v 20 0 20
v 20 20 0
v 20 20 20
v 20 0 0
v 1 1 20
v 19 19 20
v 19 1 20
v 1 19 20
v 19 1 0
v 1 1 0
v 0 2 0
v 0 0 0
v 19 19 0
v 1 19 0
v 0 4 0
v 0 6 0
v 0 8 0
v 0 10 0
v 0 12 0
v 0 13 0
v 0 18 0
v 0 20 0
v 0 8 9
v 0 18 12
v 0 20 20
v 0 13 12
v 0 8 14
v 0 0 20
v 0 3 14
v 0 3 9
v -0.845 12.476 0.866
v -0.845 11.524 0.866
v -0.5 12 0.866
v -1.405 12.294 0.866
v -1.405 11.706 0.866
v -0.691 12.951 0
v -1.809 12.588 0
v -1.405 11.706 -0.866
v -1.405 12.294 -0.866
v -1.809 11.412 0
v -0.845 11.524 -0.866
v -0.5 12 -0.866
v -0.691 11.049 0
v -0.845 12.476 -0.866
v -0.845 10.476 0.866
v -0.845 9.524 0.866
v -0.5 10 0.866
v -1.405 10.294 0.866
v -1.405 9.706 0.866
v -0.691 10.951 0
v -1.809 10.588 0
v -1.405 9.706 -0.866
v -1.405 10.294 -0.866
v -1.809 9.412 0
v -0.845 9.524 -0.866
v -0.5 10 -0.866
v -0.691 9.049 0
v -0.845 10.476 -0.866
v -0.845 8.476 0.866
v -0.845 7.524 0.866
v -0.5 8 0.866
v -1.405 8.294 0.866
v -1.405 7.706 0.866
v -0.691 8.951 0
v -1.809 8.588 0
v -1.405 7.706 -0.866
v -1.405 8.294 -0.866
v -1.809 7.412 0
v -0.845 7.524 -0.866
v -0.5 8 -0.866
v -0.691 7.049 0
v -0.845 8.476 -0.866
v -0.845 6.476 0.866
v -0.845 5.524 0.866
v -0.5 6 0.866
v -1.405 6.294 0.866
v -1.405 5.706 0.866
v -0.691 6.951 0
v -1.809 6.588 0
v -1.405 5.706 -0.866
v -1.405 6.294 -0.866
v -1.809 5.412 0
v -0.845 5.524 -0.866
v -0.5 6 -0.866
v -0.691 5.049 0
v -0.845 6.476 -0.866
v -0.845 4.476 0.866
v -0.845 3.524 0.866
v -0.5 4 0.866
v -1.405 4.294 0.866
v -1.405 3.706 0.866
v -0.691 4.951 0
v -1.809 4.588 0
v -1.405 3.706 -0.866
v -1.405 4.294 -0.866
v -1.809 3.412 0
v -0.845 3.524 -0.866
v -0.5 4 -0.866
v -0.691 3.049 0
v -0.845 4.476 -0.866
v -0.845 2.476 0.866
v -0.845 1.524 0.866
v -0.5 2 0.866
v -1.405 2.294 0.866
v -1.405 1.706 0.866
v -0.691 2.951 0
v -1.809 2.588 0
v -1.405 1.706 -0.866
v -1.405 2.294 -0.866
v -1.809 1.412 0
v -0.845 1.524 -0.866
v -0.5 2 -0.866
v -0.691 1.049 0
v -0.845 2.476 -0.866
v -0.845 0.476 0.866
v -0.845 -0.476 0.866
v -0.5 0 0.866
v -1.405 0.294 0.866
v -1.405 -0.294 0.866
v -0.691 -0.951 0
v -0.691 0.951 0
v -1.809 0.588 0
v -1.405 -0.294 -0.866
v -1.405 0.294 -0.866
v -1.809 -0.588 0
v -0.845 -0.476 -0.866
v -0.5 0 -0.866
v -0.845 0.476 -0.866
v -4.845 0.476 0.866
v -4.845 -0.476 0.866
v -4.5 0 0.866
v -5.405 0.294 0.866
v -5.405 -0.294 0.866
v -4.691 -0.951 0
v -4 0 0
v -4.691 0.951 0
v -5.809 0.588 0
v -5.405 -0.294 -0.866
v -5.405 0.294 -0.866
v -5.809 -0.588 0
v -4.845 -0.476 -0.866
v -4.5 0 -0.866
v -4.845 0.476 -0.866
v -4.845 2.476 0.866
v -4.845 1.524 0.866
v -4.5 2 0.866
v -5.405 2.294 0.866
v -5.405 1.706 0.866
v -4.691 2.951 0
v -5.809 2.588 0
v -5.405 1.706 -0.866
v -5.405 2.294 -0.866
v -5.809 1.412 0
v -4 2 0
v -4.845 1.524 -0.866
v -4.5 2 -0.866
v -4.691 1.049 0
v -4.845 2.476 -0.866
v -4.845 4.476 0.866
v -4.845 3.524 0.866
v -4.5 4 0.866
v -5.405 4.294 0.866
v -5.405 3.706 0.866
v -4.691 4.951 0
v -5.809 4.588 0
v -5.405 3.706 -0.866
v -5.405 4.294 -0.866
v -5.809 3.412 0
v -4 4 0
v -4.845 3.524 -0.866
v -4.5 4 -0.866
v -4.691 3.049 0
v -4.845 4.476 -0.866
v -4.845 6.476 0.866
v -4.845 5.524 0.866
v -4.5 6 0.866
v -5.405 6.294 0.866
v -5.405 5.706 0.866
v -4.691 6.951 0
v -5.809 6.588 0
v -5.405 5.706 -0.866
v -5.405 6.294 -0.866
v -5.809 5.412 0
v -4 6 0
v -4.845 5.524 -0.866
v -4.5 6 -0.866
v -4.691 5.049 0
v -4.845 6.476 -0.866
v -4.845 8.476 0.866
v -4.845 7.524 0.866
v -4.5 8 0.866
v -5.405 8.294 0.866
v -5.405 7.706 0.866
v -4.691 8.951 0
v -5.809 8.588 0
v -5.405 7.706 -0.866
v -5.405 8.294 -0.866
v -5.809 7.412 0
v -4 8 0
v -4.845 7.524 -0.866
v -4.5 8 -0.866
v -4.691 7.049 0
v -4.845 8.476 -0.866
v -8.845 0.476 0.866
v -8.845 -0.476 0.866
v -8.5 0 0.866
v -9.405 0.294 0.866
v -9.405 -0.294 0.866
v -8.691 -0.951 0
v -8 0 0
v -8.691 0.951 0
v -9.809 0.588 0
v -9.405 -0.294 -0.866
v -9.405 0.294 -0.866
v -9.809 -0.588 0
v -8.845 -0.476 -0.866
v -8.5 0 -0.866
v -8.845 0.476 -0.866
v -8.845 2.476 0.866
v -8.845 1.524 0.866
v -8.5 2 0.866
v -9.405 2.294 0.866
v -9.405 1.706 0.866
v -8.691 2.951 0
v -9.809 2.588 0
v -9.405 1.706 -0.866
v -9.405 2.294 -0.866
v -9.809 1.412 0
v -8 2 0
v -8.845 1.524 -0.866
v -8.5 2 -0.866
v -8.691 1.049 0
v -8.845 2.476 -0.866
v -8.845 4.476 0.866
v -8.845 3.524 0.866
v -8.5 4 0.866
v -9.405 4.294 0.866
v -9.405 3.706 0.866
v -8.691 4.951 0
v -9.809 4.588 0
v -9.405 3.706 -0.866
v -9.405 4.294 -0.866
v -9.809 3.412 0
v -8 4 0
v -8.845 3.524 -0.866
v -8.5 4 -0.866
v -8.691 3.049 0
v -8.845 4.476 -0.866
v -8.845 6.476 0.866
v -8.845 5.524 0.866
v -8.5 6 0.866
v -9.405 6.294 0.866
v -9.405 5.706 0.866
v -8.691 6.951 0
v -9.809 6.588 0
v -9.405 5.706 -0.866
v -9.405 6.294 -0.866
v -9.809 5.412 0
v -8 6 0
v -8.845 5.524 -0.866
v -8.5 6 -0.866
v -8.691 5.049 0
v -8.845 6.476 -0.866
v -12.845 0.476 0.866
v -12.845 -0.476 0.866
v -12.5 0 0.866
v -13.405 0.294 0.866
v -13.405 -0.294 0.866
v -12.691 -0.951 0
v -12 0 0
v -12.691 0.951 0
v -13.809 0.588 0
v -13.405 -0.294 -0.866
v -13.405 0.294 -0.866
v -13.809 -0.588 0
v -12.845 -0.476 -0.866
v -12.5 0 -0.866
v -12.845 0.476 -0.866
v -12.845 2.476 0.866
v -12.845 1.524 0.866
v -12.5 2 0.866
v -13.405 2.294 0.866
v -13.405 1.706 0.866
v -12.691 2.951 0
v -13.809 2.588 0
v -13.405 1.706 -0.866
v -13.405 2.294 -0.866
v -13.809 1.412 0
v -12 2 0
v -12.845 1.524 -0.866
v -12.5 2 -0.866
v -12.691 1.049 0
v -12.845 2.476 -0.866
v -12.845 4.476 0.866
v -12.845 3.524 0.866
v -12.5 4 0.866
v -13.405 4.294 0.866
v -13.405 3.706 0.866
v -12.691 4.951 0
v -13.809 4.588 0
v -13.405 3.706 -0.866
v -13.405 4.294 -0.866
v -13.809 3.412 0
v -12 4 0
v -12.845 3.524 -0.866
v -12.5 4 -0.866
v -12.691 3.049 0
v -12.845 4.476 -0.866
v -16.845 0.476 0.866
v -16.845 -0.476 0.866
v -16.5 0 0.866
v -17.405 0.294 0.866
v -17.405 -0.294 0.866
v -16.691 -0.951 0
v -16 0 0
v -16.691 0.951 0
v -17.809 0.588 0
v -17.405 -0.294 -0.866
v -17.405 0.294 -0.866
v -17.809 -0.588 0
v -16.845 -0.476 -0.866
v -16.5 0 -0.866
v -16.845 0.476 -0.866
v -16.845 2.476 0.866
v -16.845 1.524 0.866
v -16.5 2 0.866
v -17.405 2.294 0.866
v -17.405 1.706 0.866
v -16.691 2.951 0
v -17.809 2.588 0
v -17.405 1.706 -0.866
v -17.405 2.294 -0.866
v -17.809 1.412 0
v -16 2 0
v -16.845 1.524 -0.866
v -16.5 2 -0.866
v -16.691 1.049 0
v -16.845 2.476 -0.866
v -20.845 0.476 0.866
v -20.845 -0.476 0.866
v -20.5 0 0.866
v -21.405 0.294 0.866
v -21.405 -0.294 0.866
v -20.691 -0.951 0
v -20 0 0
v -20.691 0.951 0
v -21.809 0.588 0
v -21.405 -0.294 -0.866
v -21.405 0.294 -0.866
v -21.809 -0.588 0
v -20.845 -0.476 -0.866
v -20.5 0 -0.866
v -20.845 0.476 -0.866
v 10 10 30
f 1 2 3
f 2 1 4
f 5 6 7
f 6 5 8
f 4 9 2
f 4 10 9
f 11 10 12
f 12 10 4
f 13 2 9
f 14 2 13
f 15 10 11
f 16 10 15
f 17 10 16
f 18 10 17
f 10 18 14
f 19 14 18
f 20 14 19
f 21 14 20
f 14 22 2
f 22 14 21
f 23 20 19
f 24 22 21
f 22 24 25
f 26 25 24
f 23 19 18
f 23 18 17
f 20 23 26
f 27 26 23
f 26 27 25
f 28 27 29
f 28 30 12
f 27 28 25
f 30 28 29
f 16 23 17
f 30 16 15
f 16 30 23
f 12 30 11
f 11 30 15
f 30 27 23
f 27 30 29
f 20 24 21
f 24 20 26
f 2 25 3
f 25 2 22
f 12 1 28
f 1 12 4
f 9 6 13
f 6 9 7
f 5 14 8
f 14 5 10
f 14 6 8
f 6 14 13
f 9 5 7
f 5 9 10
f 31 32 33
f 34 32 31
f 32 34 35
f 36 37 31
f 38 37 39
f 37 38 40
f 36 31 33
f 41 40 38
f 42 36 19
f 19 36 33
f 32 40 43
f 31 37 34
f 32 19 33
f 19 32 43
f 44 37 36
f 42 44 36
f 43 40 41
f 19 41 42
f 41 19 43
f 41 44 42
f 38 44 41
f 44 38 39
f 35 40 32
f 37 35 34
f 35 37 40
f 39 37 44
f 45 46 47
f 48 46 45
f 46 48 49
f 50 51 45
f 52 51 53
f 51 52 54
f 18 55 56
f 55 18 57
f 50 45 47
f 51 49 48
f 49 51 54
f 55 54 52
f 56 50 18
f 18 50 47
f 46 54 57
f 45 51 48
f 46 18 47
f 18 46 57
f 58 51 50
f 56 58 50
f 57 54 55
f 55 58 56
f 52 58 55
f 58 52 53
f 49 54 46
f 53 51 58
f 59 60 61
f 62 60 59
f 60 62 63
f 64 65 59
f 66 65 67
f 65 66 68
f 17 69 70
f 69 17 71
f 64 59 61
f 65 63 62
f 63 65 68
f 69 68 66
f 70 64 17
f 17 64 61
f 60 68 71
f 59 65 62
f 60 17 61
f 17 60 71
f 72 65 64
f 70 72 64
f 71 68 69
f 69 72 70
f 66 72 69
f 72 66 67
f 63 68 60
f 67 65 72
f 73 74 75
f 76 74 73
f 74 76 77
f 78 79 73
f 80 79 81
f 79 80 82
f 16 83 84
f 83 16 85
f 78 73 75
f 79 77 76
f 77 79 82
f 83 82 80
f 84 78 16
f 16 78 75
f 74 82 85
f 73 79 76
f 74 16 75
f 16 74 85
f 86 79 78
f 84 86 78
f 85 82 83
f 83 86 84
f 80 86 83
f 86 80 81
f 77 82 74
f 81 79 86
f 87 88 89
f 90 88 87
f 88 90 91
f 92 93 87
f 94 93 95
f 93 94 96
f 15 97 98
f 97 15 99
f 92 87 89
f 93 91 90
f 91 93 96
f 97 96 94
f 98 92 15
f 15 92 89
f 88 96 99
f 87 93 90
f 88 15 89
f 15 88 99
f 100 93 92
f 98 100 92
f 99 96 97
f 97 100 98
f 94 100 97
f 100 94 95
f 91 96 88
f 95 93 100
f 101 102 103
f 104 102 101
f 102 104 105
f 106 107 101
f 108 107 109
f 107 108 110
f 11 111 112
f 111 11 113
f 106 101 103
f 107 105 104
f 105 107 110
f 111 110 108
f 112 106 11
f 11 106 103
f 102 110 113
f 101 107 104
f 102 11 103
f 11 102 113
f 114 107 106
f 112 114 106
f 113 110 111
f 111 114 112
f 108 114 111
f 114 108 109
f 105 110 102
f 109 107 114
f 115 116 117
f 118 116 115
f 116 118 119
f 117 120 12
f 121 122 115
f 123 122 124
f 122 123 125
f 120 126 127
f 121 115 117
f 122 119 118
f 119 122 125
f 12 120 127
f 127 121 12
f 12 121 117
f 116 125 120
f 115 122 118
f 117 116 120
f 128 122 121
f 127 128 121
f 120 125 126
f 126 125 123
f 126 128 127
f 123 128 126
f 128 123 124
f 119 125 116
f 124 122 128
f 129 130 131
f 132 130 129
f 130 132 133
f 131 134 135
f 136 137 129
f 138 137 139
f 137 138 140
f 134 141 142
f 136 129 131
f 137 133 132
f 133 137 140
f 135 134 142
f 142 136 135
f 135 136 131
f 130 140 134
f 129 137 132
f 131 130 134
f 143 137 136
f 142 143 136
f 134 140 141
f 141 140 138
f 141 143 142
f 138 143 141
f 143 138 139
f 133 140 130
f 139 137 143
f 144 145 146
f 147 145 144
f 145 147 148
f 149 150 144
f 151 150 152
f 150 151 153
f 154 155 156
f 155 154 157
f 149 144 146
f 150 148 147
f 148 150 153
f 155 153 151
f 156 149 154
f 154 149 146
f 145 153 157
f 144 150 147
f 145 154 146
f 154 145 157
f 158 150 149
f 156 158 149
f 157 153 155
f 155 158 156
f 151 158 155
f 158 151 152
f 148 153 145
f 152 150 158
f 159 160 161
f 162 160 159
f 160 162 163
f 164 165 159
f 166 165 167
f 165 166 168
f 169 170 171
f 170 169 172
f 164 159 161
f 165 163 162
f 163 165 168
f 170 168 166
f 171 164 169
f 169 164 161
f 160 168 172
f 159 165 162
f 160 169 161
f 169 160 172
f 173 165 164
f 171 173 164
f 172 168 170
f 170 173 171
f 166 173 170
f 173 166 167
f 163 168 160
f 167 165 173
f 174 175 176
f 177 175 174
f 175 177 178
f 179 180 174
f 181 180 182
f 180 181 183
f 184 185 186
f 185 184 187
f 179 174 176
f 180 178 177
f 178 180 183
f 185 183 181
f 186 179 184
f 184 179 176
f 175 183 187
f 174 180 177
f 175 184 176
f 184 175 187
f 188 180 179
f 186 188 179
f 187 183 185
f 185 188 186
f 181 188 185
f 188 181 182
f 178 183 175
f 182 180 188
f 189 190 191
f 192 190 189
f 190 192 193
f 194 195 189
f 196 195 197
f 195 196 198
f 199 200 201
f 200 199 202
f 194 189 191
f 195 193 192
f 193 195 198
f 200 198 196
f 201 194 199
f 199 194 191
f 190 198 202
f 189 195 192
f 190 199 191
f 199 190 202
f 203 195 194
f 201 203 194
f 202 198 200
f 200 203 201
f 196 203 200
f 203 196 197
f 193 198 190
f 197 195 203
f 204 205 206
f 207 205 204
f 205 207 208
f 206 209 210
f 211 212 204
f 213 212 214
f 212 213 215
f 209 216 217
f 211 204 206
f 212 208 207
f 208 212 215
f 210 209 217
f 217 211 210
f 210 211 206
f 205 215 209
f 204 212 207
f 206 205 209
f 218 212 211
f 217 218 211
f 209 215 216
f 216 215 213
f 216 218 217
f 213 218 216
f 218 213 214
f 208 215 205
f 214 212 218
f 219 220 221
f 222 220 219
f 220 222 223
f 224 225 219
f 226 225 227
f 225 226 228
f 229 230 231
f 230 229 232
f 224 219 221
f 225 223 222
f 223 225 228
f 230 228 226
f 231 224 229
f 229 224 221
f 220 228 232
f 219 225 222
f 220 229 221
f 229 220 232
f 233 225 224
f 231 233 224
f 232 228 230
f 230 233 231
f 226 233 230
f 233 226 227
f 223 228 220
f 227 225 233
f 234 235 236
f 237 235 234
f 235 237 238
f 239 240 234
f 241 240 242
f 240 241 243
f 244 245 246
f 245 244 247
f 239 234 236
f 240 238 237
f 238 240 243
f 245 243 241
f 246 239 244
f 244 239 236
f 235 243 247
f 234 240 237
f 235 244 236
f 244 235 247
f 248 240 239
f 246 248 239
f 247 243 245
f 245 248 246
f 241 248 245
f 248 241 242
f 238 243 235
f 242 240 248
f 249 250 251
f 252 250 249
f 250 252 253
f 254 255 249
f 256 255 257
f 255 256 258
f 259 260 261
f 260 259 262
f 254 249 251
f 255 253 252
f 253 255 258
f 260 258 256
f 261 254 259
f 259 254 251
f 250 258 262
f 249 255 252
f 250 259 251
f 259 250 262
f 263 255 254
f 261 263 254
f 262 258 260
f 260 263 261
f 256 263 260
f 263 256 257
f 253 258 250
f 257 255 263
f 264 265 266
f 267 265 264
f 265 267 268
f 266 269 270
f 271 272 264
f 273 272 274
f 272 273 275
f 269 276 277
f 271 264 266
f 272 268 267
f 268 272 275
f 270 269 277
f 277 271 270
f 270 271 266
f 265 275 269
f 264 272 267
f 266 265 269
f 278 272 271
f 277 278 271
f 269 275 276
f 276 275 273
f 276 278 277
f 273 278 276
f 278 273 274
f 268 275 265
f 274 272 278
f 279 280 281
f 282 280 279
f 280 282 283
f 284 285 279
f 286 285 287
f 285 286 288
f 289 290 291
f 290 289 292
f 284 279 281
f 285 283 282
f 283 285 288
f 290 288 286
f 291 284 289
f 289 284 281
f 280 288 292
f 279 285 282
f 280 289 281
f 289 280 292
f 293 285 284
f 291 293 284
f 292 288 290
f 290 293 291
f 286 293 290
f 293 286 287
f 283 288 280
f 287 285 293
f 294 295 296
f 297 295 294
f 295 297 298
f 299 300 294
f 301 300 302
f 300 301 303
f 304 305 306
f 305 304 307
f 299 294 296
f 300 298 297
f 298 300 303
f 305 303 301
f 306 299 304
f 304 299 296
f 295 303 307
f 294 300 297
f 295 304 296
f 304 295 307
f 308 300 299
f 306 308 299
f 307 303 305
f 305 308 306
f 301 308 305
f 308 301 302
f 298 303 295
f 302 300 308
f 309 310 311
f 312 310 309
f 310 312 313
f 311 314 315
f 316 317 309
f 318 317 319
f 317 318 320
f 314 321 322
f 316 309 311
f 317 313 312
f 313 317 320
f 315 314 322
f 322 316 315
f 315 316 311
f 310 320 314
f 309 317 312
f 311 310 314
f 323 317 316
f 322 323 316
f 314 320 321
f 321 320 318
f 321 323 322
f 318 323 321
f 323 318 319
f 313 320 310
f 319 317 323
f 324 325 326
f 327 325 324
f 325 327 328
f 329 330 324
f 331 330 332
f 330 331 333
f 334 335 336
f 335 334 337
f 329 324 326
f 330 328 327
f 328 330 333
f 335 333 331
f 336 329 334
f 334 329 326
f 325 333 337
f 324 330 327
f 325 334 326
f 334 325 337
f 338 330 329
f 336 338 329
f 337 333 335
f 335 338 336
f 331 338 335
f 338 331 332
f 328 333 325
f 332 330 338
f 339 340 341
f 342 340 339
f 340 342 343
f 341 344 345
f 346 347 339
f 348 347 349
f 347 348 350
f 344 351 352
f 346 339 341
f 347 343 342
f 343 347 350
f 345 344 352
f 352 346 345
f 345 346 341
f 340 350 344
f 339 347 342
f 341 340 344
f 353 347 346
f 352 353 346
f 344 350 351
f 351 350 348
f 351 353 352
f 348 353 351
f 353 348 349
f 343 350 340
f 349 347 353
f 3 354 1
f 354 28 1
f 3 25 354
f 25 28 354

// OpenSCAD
wall_height=20;
wall_length=20;
wall_width=20;

window_height=5;
window_length=1;
window_width=5;

door_height=12;
door_length=15;
door_width=5;

bush_size=1;



difference(){

cube([wall_height,wall_width,wall_length]);

translate([10,10,10]) cube([18,18,38], center=true);

rotate(a=90) translate([3,0,9]) cube([window_width,window_length,window_height]);

rotate(a=90) translate([13,0,0]) cube([door_width,door_height,door_height]);

}

translate([-1,12,0]) sphere(bush_size);
translate([-1,10,0]) sphere(bush_size);
translate([-1,8,0]) sphere(bush_size);
translate([-1,6,0]) sphere(bush_size);
translate([-1,4,0]) sphere(bush_size);
translate([-1,2,0]) sphere(bush_size);
translate([-1,0,0]) sphere(bush_size);
translate([-5,0,0]) sphere(bush_size);
translate([-5,2,0]) sphere(bush_size);
translate([-5,4,0]) sphere(bush_size);
translate([-5,6,0]) sphere(bush_size);
translate([-5,8,0]) sphere(bush_size);
translate([-9,0,0]) sphere(bush_size);
translate([-9,2,0]) sphere(bush_size);
translate([-9,4,0]) sphere(bush_size);
translate([-9,6,0]) sphere(bush_size);
translate([-13,0,0]) sphere(bush_size);
translate([-13,2,0]) sphere(bush_size);
translate([-13,4,0]) sphere(bush_size);
translate([-17,0,0]) sphere(bush_size);
translate([-17,2,0]) sphere(bush_size);
translate([-21,0,0]) sphere(bush_size);


translate([10,10,20]) polyhedron(
  points=[ [10,10,0],[10,-10,0],[-10,-10,0],[-10,10,0], // the four points at base
           [0,0,10]  ],                                 // the apex point 
  triangles=[ [0,1,4],[1,2,4],[2,3,4],[3,0,4],          // each triangle side
              [1,0,3],[2,1,3] ]                         // two triangles for square base
 );
